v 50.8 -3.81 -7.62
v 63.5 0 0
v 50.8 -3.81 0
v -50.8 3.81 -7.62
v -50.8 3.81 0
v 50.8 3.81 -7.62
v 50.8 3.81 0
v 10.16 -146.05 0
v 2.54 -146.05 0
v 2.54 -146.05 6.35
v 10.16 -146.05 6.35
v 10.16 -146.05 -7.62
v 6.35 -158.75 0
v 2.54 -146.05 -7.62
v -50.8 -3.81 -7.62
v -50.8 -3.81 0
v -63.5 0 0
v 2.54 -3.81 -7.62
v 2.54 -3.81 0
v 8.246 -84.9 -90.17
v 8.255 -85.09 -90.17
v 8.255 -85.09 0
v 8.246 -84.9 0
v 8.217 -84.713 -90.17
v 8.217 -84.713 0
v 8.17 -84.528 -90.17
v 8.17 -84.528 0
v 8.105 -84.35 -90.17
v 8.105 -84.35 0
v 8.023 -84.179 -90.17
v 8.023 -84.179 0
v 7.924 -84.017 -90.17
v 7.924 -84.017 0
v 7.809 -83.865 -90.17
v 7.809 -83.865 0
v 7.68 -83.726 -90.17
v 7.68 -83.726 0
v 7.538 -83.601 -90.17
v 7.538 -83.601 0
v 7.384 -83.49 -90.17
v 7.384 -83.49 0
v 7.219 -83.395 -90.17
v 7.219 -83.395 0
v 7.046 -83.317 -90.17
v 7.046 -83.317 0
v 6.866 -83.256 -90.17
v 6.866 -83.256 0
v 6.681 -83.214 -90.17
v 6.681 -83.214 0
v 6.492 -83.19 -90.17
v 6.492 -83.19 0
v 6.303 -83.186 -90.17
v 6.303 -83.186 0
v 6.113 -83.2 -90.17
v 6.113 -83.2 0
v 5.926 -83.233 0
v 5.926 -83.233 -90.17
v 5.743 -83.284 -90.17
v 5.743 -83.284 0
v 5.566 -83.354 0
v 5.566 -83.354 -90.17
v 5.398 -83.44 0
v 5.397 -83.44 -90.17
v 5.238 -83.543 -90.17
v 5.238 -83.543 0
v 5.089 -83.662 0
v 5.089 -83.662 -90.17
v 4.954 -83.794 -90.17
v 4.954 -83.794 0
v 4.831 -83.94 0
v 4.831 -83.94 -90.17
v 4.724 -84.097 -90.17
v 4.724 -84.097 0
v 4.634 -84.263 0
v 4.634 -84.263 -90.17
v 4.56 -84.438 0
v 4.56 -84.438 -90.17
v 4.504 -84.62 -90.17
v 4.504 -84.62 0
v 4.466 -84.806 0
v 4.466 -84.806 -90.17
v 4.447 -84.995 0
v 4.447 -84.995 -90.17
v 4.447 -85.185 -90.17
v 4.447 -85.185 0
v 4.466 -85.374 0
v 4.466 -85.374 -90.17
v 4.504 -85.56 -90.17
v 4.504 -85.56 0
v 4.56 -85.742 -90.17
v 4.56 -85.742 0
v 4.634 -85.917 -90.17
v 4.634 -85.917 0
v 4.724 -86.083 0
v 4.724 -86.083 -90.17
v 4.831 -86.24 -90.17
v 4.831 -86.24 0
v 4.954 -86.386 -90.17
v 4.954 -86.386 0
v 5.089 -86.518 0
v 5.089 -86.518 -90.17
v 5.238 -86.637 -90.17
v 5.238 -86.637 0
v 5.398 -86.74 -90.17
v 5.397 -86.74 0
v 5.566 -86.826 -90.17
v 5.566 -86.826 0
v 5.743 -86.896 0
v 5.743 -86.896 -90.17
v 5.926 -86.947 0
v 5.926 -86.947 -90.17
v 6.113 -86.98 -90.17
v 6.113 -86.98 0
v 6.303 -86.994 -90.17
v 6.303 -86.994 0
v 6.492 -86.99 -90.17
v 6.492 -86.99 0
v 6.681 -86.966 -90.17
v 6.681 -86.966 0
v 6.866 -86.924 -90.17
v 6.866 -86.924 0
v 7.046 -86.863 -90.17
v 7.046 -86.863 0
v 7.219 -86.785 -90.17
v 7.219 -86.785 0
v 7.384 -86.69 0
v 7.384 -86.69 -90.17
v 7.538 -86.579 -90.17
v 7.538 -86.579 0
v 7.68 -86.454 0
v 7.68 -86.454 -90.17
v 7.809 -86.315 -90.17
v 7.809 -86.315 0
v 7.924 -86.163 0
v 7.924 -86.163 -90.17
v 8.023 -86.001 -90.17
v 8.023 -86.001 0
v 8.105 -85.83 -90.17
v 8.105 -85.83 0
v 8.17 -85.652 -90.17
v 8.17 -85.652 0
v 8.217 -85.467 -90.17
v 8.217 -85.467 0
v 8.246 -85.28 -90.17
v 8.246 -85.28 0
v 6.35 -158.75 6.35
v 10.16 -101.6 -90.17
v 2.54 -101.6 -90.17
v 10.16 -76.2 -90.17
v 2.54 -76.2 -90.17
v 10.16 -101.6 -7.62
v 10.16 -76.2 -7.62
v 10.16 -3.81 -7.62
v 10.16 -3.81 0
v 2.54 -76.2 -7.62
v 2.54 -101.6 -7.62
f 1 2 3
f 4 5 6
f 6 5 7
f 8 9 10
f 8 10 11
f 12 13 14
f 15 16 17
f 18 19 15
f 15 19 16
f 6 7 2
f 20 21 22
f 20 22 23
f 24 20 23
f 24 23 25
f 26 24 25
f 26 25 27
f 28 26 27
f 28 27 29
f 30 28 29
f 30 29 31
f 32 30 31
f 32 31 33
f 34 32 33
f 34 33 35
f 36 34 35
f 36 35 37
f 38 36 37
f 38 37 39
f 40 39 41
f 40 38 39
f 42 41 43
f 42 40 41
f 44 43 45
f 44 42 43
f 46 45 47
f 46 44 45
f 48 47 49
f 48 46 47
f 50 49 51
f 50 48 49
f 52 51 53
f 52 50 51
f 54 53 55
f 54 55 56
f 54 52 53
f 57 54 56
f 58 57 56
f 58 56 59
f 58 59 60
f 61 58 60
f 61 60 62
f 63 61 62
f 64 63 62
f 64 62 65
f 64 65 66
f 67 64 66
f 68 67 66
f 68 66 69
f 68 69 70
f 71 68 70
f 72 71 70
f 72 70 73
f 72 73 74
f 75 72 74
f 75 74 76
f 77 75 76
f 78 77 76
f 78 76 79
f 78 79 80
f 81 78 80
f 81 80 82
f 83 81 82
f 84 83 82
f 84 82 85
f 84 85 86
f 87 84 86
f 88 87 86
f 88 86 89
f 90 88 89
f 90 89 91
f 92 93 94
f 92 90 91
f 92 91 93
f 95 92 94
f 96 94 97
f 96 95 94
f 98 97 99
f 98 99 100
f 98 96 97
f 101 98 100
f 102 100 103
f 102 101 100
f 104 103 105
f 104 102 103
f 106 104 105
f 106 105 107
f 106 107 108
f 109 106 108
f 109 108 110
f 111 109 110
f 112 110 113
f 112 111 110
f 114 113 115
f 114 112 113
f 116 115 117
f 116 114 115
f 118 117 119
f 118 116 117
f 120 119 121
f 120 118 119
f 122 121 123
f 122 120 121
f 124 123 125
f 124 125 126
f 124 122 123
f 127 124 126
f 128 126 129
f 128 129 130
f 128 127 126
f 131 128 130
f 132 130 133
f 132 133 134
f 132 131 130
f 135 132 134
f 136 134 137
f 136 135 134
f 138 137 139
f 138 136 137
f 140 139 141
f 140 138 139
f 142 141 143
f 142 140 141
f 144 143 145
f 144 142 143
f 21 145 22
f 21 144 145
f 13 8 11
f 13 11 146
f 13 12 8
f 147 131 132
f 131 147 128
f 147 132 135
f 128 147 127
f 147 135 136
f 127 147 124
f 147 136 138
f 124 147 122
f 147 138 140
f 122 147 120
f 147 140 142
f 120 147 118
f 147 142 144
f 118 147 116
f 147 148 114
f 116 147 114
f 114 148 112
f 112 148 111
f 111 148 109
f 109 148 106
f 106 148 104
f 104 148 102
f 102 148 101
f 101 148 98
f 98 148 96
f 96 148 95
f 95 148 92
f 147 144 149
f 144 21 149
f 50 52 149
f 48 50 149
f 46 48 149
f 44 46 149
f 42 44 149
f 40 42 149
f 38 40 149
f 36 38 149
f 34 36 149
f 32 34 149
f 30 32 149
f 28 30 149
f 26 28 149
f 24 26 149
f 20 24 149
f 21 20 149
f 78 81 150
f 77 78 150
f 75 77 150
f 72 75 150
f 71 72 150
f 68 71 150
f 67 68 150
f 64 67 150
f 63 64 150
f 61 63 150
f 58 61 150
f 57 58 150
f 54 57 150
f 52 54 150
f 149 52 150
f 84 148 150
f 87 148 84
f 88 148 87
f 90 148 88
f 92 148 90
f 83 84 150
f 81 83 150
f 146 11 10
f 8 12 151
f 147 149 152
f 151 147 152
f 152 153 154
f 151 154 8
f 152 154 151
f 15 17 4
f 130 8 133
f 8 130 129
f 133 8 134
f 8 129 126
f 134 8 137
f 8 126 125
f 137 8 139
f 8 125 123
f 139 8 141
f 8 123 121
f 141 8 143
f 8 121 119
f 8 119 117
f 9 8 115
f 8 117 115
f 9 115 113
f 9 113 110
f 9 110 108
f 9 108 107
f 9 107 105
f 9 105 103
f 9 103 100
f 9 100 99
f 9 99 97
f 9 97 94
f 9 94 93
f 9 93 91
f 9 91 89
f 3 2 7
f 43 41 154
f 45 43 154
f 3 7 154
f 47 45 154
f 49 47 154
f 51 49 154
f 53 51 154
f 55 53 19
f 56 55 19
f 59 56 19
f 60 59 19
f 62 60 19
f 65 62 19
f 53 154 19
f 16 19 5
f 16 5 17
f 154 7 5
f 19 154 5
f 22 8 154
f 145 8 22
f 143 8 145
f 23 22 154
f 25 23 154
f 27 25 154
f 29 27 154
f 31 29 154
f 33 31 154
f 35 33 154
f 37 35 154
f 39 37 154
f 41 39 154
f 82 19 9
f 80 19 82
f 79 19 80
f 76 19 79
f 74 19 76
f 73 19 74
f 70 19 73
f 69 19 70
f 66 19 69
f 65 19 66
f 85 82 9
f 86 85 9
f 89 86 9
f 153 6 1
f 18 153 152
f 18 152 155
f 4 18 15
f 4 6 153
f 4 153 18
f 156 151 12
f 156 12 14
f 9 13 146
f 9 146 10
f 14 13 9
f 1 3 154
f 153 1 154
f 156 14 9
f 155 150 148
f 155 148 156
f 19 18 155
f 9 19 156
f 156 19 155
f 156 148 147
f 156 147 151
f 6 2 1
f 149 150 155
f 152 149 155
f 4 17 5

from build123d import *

# Parameters (mm, degrees)
SKETCH1_R               = 1.905
BOSS_EXTRUDE1_DEPTH     = 7.62
CUT_EXTRUDE1_DEPTH      = 175.688488459
CUT_EXTRUDE2_DEPTH      = 176.172550646
BOSS_EXTRUDE3_DEPTH     = 6.35
SKETCH7_W               = 82.55
SKETCH7_H               = 25.4
BOSS_EXTRUDE4_DEPTH     = 7.62
CUT_EXTRUDE3_DEPTH      = 190.863938124
CUT_EXTRUDE3_DEPTH_BACK = 190.863938124
SKETCH8_R               = 1.905


with BuildPart() as part:
    # Sketch1 → Boss-Extrude1 (new body)
    with BuildSketch(Plane.XY):
        Polygon((-63.5, 0), (-50.8, 3.81), (50.8, 3.81), (63.5, 0), (50.8, -3.81), (10.16, -3.81), (10.16, -146.05), (6.35, -158.75), (2.54, -146.05), (2.54, -3.81), (-50.8, -3.81), align=None)
        with Locations((6.35, -85.09)):
            Circle(SKETCH1_R, mode=Mode.SUBTRACT)
    extrude(amount=-BOSS_EXTRUDE1_DEPTH)

    # Sketch3 → Cut-Extrude1 (cut, through all)
    with BuildSketch(Plane(origin=(0, 3.81, 0), x_dir=(1, 0, 0), z_dir=(0, 1, 0))):
        Polygon((-63.5, 0), (-50.8, 7.62), (-63.5, 7.62), align=None)
        Polygon((63.5, 7.62), (63.5, 0), (50.8, 7.62), align=None)
    extrude(amount=-CUT_EXTRUDE1_DEPTH, mode=Mode.SUBTRACT)

    # Sketch4 → Cut-Extrude2 (cut, through all)
    with BuildSketch(Plane(origin=(10.16, 0, 0), x_dir=(0, 0, -1), z_dir=(1, 0, 0))):
        Polygon((0, -158.75), (7.62, -146.05), (7.62, -158.75), align=None)
    extrude(amount=-CUT_EXTRUDE2_DEPTH, mode=Mode.SUBTRACT)

    # Sketch6 → Boss-Extrude3 (add)
    with BuildSketch(Plane.XY):
        Polygon((2.54, -146.05), (10.16, -146.05), (6.35, -158.75), align=None)
    extrude(amount=BOSS_EXTRUDE3_DEPTH)

    # Sketch7 → Boss-Extrude4 (add)
    with BuildSketch(Plane.ZY.offset(-2.54)):
        with Locations((-48.895, -88.9)):
            Rectangle(SKETCH7_W, SKETCH7_H)
    extrude(amount=-BOSS_EXTRUDE4_DEPTH)

    # Sketch8 → Cut-Extrude3 (cut, two sides: drawn at the far end of the back side and taken through both)
    with BuildSketch(Plane.XY.offset(-7.62).offset(-CUT_EXTRUDE3_DEPTH_BACK)):
        with Locations((6.35, -85.09)):
            Circle(SKETCH8_R)
    extrude(amount=CUT_EXTRUDE3_DEPTH + CUT_EXTRUDE3_DEPTH_BACK, mode=Mode.SUBTRACT)


solid = part.part
